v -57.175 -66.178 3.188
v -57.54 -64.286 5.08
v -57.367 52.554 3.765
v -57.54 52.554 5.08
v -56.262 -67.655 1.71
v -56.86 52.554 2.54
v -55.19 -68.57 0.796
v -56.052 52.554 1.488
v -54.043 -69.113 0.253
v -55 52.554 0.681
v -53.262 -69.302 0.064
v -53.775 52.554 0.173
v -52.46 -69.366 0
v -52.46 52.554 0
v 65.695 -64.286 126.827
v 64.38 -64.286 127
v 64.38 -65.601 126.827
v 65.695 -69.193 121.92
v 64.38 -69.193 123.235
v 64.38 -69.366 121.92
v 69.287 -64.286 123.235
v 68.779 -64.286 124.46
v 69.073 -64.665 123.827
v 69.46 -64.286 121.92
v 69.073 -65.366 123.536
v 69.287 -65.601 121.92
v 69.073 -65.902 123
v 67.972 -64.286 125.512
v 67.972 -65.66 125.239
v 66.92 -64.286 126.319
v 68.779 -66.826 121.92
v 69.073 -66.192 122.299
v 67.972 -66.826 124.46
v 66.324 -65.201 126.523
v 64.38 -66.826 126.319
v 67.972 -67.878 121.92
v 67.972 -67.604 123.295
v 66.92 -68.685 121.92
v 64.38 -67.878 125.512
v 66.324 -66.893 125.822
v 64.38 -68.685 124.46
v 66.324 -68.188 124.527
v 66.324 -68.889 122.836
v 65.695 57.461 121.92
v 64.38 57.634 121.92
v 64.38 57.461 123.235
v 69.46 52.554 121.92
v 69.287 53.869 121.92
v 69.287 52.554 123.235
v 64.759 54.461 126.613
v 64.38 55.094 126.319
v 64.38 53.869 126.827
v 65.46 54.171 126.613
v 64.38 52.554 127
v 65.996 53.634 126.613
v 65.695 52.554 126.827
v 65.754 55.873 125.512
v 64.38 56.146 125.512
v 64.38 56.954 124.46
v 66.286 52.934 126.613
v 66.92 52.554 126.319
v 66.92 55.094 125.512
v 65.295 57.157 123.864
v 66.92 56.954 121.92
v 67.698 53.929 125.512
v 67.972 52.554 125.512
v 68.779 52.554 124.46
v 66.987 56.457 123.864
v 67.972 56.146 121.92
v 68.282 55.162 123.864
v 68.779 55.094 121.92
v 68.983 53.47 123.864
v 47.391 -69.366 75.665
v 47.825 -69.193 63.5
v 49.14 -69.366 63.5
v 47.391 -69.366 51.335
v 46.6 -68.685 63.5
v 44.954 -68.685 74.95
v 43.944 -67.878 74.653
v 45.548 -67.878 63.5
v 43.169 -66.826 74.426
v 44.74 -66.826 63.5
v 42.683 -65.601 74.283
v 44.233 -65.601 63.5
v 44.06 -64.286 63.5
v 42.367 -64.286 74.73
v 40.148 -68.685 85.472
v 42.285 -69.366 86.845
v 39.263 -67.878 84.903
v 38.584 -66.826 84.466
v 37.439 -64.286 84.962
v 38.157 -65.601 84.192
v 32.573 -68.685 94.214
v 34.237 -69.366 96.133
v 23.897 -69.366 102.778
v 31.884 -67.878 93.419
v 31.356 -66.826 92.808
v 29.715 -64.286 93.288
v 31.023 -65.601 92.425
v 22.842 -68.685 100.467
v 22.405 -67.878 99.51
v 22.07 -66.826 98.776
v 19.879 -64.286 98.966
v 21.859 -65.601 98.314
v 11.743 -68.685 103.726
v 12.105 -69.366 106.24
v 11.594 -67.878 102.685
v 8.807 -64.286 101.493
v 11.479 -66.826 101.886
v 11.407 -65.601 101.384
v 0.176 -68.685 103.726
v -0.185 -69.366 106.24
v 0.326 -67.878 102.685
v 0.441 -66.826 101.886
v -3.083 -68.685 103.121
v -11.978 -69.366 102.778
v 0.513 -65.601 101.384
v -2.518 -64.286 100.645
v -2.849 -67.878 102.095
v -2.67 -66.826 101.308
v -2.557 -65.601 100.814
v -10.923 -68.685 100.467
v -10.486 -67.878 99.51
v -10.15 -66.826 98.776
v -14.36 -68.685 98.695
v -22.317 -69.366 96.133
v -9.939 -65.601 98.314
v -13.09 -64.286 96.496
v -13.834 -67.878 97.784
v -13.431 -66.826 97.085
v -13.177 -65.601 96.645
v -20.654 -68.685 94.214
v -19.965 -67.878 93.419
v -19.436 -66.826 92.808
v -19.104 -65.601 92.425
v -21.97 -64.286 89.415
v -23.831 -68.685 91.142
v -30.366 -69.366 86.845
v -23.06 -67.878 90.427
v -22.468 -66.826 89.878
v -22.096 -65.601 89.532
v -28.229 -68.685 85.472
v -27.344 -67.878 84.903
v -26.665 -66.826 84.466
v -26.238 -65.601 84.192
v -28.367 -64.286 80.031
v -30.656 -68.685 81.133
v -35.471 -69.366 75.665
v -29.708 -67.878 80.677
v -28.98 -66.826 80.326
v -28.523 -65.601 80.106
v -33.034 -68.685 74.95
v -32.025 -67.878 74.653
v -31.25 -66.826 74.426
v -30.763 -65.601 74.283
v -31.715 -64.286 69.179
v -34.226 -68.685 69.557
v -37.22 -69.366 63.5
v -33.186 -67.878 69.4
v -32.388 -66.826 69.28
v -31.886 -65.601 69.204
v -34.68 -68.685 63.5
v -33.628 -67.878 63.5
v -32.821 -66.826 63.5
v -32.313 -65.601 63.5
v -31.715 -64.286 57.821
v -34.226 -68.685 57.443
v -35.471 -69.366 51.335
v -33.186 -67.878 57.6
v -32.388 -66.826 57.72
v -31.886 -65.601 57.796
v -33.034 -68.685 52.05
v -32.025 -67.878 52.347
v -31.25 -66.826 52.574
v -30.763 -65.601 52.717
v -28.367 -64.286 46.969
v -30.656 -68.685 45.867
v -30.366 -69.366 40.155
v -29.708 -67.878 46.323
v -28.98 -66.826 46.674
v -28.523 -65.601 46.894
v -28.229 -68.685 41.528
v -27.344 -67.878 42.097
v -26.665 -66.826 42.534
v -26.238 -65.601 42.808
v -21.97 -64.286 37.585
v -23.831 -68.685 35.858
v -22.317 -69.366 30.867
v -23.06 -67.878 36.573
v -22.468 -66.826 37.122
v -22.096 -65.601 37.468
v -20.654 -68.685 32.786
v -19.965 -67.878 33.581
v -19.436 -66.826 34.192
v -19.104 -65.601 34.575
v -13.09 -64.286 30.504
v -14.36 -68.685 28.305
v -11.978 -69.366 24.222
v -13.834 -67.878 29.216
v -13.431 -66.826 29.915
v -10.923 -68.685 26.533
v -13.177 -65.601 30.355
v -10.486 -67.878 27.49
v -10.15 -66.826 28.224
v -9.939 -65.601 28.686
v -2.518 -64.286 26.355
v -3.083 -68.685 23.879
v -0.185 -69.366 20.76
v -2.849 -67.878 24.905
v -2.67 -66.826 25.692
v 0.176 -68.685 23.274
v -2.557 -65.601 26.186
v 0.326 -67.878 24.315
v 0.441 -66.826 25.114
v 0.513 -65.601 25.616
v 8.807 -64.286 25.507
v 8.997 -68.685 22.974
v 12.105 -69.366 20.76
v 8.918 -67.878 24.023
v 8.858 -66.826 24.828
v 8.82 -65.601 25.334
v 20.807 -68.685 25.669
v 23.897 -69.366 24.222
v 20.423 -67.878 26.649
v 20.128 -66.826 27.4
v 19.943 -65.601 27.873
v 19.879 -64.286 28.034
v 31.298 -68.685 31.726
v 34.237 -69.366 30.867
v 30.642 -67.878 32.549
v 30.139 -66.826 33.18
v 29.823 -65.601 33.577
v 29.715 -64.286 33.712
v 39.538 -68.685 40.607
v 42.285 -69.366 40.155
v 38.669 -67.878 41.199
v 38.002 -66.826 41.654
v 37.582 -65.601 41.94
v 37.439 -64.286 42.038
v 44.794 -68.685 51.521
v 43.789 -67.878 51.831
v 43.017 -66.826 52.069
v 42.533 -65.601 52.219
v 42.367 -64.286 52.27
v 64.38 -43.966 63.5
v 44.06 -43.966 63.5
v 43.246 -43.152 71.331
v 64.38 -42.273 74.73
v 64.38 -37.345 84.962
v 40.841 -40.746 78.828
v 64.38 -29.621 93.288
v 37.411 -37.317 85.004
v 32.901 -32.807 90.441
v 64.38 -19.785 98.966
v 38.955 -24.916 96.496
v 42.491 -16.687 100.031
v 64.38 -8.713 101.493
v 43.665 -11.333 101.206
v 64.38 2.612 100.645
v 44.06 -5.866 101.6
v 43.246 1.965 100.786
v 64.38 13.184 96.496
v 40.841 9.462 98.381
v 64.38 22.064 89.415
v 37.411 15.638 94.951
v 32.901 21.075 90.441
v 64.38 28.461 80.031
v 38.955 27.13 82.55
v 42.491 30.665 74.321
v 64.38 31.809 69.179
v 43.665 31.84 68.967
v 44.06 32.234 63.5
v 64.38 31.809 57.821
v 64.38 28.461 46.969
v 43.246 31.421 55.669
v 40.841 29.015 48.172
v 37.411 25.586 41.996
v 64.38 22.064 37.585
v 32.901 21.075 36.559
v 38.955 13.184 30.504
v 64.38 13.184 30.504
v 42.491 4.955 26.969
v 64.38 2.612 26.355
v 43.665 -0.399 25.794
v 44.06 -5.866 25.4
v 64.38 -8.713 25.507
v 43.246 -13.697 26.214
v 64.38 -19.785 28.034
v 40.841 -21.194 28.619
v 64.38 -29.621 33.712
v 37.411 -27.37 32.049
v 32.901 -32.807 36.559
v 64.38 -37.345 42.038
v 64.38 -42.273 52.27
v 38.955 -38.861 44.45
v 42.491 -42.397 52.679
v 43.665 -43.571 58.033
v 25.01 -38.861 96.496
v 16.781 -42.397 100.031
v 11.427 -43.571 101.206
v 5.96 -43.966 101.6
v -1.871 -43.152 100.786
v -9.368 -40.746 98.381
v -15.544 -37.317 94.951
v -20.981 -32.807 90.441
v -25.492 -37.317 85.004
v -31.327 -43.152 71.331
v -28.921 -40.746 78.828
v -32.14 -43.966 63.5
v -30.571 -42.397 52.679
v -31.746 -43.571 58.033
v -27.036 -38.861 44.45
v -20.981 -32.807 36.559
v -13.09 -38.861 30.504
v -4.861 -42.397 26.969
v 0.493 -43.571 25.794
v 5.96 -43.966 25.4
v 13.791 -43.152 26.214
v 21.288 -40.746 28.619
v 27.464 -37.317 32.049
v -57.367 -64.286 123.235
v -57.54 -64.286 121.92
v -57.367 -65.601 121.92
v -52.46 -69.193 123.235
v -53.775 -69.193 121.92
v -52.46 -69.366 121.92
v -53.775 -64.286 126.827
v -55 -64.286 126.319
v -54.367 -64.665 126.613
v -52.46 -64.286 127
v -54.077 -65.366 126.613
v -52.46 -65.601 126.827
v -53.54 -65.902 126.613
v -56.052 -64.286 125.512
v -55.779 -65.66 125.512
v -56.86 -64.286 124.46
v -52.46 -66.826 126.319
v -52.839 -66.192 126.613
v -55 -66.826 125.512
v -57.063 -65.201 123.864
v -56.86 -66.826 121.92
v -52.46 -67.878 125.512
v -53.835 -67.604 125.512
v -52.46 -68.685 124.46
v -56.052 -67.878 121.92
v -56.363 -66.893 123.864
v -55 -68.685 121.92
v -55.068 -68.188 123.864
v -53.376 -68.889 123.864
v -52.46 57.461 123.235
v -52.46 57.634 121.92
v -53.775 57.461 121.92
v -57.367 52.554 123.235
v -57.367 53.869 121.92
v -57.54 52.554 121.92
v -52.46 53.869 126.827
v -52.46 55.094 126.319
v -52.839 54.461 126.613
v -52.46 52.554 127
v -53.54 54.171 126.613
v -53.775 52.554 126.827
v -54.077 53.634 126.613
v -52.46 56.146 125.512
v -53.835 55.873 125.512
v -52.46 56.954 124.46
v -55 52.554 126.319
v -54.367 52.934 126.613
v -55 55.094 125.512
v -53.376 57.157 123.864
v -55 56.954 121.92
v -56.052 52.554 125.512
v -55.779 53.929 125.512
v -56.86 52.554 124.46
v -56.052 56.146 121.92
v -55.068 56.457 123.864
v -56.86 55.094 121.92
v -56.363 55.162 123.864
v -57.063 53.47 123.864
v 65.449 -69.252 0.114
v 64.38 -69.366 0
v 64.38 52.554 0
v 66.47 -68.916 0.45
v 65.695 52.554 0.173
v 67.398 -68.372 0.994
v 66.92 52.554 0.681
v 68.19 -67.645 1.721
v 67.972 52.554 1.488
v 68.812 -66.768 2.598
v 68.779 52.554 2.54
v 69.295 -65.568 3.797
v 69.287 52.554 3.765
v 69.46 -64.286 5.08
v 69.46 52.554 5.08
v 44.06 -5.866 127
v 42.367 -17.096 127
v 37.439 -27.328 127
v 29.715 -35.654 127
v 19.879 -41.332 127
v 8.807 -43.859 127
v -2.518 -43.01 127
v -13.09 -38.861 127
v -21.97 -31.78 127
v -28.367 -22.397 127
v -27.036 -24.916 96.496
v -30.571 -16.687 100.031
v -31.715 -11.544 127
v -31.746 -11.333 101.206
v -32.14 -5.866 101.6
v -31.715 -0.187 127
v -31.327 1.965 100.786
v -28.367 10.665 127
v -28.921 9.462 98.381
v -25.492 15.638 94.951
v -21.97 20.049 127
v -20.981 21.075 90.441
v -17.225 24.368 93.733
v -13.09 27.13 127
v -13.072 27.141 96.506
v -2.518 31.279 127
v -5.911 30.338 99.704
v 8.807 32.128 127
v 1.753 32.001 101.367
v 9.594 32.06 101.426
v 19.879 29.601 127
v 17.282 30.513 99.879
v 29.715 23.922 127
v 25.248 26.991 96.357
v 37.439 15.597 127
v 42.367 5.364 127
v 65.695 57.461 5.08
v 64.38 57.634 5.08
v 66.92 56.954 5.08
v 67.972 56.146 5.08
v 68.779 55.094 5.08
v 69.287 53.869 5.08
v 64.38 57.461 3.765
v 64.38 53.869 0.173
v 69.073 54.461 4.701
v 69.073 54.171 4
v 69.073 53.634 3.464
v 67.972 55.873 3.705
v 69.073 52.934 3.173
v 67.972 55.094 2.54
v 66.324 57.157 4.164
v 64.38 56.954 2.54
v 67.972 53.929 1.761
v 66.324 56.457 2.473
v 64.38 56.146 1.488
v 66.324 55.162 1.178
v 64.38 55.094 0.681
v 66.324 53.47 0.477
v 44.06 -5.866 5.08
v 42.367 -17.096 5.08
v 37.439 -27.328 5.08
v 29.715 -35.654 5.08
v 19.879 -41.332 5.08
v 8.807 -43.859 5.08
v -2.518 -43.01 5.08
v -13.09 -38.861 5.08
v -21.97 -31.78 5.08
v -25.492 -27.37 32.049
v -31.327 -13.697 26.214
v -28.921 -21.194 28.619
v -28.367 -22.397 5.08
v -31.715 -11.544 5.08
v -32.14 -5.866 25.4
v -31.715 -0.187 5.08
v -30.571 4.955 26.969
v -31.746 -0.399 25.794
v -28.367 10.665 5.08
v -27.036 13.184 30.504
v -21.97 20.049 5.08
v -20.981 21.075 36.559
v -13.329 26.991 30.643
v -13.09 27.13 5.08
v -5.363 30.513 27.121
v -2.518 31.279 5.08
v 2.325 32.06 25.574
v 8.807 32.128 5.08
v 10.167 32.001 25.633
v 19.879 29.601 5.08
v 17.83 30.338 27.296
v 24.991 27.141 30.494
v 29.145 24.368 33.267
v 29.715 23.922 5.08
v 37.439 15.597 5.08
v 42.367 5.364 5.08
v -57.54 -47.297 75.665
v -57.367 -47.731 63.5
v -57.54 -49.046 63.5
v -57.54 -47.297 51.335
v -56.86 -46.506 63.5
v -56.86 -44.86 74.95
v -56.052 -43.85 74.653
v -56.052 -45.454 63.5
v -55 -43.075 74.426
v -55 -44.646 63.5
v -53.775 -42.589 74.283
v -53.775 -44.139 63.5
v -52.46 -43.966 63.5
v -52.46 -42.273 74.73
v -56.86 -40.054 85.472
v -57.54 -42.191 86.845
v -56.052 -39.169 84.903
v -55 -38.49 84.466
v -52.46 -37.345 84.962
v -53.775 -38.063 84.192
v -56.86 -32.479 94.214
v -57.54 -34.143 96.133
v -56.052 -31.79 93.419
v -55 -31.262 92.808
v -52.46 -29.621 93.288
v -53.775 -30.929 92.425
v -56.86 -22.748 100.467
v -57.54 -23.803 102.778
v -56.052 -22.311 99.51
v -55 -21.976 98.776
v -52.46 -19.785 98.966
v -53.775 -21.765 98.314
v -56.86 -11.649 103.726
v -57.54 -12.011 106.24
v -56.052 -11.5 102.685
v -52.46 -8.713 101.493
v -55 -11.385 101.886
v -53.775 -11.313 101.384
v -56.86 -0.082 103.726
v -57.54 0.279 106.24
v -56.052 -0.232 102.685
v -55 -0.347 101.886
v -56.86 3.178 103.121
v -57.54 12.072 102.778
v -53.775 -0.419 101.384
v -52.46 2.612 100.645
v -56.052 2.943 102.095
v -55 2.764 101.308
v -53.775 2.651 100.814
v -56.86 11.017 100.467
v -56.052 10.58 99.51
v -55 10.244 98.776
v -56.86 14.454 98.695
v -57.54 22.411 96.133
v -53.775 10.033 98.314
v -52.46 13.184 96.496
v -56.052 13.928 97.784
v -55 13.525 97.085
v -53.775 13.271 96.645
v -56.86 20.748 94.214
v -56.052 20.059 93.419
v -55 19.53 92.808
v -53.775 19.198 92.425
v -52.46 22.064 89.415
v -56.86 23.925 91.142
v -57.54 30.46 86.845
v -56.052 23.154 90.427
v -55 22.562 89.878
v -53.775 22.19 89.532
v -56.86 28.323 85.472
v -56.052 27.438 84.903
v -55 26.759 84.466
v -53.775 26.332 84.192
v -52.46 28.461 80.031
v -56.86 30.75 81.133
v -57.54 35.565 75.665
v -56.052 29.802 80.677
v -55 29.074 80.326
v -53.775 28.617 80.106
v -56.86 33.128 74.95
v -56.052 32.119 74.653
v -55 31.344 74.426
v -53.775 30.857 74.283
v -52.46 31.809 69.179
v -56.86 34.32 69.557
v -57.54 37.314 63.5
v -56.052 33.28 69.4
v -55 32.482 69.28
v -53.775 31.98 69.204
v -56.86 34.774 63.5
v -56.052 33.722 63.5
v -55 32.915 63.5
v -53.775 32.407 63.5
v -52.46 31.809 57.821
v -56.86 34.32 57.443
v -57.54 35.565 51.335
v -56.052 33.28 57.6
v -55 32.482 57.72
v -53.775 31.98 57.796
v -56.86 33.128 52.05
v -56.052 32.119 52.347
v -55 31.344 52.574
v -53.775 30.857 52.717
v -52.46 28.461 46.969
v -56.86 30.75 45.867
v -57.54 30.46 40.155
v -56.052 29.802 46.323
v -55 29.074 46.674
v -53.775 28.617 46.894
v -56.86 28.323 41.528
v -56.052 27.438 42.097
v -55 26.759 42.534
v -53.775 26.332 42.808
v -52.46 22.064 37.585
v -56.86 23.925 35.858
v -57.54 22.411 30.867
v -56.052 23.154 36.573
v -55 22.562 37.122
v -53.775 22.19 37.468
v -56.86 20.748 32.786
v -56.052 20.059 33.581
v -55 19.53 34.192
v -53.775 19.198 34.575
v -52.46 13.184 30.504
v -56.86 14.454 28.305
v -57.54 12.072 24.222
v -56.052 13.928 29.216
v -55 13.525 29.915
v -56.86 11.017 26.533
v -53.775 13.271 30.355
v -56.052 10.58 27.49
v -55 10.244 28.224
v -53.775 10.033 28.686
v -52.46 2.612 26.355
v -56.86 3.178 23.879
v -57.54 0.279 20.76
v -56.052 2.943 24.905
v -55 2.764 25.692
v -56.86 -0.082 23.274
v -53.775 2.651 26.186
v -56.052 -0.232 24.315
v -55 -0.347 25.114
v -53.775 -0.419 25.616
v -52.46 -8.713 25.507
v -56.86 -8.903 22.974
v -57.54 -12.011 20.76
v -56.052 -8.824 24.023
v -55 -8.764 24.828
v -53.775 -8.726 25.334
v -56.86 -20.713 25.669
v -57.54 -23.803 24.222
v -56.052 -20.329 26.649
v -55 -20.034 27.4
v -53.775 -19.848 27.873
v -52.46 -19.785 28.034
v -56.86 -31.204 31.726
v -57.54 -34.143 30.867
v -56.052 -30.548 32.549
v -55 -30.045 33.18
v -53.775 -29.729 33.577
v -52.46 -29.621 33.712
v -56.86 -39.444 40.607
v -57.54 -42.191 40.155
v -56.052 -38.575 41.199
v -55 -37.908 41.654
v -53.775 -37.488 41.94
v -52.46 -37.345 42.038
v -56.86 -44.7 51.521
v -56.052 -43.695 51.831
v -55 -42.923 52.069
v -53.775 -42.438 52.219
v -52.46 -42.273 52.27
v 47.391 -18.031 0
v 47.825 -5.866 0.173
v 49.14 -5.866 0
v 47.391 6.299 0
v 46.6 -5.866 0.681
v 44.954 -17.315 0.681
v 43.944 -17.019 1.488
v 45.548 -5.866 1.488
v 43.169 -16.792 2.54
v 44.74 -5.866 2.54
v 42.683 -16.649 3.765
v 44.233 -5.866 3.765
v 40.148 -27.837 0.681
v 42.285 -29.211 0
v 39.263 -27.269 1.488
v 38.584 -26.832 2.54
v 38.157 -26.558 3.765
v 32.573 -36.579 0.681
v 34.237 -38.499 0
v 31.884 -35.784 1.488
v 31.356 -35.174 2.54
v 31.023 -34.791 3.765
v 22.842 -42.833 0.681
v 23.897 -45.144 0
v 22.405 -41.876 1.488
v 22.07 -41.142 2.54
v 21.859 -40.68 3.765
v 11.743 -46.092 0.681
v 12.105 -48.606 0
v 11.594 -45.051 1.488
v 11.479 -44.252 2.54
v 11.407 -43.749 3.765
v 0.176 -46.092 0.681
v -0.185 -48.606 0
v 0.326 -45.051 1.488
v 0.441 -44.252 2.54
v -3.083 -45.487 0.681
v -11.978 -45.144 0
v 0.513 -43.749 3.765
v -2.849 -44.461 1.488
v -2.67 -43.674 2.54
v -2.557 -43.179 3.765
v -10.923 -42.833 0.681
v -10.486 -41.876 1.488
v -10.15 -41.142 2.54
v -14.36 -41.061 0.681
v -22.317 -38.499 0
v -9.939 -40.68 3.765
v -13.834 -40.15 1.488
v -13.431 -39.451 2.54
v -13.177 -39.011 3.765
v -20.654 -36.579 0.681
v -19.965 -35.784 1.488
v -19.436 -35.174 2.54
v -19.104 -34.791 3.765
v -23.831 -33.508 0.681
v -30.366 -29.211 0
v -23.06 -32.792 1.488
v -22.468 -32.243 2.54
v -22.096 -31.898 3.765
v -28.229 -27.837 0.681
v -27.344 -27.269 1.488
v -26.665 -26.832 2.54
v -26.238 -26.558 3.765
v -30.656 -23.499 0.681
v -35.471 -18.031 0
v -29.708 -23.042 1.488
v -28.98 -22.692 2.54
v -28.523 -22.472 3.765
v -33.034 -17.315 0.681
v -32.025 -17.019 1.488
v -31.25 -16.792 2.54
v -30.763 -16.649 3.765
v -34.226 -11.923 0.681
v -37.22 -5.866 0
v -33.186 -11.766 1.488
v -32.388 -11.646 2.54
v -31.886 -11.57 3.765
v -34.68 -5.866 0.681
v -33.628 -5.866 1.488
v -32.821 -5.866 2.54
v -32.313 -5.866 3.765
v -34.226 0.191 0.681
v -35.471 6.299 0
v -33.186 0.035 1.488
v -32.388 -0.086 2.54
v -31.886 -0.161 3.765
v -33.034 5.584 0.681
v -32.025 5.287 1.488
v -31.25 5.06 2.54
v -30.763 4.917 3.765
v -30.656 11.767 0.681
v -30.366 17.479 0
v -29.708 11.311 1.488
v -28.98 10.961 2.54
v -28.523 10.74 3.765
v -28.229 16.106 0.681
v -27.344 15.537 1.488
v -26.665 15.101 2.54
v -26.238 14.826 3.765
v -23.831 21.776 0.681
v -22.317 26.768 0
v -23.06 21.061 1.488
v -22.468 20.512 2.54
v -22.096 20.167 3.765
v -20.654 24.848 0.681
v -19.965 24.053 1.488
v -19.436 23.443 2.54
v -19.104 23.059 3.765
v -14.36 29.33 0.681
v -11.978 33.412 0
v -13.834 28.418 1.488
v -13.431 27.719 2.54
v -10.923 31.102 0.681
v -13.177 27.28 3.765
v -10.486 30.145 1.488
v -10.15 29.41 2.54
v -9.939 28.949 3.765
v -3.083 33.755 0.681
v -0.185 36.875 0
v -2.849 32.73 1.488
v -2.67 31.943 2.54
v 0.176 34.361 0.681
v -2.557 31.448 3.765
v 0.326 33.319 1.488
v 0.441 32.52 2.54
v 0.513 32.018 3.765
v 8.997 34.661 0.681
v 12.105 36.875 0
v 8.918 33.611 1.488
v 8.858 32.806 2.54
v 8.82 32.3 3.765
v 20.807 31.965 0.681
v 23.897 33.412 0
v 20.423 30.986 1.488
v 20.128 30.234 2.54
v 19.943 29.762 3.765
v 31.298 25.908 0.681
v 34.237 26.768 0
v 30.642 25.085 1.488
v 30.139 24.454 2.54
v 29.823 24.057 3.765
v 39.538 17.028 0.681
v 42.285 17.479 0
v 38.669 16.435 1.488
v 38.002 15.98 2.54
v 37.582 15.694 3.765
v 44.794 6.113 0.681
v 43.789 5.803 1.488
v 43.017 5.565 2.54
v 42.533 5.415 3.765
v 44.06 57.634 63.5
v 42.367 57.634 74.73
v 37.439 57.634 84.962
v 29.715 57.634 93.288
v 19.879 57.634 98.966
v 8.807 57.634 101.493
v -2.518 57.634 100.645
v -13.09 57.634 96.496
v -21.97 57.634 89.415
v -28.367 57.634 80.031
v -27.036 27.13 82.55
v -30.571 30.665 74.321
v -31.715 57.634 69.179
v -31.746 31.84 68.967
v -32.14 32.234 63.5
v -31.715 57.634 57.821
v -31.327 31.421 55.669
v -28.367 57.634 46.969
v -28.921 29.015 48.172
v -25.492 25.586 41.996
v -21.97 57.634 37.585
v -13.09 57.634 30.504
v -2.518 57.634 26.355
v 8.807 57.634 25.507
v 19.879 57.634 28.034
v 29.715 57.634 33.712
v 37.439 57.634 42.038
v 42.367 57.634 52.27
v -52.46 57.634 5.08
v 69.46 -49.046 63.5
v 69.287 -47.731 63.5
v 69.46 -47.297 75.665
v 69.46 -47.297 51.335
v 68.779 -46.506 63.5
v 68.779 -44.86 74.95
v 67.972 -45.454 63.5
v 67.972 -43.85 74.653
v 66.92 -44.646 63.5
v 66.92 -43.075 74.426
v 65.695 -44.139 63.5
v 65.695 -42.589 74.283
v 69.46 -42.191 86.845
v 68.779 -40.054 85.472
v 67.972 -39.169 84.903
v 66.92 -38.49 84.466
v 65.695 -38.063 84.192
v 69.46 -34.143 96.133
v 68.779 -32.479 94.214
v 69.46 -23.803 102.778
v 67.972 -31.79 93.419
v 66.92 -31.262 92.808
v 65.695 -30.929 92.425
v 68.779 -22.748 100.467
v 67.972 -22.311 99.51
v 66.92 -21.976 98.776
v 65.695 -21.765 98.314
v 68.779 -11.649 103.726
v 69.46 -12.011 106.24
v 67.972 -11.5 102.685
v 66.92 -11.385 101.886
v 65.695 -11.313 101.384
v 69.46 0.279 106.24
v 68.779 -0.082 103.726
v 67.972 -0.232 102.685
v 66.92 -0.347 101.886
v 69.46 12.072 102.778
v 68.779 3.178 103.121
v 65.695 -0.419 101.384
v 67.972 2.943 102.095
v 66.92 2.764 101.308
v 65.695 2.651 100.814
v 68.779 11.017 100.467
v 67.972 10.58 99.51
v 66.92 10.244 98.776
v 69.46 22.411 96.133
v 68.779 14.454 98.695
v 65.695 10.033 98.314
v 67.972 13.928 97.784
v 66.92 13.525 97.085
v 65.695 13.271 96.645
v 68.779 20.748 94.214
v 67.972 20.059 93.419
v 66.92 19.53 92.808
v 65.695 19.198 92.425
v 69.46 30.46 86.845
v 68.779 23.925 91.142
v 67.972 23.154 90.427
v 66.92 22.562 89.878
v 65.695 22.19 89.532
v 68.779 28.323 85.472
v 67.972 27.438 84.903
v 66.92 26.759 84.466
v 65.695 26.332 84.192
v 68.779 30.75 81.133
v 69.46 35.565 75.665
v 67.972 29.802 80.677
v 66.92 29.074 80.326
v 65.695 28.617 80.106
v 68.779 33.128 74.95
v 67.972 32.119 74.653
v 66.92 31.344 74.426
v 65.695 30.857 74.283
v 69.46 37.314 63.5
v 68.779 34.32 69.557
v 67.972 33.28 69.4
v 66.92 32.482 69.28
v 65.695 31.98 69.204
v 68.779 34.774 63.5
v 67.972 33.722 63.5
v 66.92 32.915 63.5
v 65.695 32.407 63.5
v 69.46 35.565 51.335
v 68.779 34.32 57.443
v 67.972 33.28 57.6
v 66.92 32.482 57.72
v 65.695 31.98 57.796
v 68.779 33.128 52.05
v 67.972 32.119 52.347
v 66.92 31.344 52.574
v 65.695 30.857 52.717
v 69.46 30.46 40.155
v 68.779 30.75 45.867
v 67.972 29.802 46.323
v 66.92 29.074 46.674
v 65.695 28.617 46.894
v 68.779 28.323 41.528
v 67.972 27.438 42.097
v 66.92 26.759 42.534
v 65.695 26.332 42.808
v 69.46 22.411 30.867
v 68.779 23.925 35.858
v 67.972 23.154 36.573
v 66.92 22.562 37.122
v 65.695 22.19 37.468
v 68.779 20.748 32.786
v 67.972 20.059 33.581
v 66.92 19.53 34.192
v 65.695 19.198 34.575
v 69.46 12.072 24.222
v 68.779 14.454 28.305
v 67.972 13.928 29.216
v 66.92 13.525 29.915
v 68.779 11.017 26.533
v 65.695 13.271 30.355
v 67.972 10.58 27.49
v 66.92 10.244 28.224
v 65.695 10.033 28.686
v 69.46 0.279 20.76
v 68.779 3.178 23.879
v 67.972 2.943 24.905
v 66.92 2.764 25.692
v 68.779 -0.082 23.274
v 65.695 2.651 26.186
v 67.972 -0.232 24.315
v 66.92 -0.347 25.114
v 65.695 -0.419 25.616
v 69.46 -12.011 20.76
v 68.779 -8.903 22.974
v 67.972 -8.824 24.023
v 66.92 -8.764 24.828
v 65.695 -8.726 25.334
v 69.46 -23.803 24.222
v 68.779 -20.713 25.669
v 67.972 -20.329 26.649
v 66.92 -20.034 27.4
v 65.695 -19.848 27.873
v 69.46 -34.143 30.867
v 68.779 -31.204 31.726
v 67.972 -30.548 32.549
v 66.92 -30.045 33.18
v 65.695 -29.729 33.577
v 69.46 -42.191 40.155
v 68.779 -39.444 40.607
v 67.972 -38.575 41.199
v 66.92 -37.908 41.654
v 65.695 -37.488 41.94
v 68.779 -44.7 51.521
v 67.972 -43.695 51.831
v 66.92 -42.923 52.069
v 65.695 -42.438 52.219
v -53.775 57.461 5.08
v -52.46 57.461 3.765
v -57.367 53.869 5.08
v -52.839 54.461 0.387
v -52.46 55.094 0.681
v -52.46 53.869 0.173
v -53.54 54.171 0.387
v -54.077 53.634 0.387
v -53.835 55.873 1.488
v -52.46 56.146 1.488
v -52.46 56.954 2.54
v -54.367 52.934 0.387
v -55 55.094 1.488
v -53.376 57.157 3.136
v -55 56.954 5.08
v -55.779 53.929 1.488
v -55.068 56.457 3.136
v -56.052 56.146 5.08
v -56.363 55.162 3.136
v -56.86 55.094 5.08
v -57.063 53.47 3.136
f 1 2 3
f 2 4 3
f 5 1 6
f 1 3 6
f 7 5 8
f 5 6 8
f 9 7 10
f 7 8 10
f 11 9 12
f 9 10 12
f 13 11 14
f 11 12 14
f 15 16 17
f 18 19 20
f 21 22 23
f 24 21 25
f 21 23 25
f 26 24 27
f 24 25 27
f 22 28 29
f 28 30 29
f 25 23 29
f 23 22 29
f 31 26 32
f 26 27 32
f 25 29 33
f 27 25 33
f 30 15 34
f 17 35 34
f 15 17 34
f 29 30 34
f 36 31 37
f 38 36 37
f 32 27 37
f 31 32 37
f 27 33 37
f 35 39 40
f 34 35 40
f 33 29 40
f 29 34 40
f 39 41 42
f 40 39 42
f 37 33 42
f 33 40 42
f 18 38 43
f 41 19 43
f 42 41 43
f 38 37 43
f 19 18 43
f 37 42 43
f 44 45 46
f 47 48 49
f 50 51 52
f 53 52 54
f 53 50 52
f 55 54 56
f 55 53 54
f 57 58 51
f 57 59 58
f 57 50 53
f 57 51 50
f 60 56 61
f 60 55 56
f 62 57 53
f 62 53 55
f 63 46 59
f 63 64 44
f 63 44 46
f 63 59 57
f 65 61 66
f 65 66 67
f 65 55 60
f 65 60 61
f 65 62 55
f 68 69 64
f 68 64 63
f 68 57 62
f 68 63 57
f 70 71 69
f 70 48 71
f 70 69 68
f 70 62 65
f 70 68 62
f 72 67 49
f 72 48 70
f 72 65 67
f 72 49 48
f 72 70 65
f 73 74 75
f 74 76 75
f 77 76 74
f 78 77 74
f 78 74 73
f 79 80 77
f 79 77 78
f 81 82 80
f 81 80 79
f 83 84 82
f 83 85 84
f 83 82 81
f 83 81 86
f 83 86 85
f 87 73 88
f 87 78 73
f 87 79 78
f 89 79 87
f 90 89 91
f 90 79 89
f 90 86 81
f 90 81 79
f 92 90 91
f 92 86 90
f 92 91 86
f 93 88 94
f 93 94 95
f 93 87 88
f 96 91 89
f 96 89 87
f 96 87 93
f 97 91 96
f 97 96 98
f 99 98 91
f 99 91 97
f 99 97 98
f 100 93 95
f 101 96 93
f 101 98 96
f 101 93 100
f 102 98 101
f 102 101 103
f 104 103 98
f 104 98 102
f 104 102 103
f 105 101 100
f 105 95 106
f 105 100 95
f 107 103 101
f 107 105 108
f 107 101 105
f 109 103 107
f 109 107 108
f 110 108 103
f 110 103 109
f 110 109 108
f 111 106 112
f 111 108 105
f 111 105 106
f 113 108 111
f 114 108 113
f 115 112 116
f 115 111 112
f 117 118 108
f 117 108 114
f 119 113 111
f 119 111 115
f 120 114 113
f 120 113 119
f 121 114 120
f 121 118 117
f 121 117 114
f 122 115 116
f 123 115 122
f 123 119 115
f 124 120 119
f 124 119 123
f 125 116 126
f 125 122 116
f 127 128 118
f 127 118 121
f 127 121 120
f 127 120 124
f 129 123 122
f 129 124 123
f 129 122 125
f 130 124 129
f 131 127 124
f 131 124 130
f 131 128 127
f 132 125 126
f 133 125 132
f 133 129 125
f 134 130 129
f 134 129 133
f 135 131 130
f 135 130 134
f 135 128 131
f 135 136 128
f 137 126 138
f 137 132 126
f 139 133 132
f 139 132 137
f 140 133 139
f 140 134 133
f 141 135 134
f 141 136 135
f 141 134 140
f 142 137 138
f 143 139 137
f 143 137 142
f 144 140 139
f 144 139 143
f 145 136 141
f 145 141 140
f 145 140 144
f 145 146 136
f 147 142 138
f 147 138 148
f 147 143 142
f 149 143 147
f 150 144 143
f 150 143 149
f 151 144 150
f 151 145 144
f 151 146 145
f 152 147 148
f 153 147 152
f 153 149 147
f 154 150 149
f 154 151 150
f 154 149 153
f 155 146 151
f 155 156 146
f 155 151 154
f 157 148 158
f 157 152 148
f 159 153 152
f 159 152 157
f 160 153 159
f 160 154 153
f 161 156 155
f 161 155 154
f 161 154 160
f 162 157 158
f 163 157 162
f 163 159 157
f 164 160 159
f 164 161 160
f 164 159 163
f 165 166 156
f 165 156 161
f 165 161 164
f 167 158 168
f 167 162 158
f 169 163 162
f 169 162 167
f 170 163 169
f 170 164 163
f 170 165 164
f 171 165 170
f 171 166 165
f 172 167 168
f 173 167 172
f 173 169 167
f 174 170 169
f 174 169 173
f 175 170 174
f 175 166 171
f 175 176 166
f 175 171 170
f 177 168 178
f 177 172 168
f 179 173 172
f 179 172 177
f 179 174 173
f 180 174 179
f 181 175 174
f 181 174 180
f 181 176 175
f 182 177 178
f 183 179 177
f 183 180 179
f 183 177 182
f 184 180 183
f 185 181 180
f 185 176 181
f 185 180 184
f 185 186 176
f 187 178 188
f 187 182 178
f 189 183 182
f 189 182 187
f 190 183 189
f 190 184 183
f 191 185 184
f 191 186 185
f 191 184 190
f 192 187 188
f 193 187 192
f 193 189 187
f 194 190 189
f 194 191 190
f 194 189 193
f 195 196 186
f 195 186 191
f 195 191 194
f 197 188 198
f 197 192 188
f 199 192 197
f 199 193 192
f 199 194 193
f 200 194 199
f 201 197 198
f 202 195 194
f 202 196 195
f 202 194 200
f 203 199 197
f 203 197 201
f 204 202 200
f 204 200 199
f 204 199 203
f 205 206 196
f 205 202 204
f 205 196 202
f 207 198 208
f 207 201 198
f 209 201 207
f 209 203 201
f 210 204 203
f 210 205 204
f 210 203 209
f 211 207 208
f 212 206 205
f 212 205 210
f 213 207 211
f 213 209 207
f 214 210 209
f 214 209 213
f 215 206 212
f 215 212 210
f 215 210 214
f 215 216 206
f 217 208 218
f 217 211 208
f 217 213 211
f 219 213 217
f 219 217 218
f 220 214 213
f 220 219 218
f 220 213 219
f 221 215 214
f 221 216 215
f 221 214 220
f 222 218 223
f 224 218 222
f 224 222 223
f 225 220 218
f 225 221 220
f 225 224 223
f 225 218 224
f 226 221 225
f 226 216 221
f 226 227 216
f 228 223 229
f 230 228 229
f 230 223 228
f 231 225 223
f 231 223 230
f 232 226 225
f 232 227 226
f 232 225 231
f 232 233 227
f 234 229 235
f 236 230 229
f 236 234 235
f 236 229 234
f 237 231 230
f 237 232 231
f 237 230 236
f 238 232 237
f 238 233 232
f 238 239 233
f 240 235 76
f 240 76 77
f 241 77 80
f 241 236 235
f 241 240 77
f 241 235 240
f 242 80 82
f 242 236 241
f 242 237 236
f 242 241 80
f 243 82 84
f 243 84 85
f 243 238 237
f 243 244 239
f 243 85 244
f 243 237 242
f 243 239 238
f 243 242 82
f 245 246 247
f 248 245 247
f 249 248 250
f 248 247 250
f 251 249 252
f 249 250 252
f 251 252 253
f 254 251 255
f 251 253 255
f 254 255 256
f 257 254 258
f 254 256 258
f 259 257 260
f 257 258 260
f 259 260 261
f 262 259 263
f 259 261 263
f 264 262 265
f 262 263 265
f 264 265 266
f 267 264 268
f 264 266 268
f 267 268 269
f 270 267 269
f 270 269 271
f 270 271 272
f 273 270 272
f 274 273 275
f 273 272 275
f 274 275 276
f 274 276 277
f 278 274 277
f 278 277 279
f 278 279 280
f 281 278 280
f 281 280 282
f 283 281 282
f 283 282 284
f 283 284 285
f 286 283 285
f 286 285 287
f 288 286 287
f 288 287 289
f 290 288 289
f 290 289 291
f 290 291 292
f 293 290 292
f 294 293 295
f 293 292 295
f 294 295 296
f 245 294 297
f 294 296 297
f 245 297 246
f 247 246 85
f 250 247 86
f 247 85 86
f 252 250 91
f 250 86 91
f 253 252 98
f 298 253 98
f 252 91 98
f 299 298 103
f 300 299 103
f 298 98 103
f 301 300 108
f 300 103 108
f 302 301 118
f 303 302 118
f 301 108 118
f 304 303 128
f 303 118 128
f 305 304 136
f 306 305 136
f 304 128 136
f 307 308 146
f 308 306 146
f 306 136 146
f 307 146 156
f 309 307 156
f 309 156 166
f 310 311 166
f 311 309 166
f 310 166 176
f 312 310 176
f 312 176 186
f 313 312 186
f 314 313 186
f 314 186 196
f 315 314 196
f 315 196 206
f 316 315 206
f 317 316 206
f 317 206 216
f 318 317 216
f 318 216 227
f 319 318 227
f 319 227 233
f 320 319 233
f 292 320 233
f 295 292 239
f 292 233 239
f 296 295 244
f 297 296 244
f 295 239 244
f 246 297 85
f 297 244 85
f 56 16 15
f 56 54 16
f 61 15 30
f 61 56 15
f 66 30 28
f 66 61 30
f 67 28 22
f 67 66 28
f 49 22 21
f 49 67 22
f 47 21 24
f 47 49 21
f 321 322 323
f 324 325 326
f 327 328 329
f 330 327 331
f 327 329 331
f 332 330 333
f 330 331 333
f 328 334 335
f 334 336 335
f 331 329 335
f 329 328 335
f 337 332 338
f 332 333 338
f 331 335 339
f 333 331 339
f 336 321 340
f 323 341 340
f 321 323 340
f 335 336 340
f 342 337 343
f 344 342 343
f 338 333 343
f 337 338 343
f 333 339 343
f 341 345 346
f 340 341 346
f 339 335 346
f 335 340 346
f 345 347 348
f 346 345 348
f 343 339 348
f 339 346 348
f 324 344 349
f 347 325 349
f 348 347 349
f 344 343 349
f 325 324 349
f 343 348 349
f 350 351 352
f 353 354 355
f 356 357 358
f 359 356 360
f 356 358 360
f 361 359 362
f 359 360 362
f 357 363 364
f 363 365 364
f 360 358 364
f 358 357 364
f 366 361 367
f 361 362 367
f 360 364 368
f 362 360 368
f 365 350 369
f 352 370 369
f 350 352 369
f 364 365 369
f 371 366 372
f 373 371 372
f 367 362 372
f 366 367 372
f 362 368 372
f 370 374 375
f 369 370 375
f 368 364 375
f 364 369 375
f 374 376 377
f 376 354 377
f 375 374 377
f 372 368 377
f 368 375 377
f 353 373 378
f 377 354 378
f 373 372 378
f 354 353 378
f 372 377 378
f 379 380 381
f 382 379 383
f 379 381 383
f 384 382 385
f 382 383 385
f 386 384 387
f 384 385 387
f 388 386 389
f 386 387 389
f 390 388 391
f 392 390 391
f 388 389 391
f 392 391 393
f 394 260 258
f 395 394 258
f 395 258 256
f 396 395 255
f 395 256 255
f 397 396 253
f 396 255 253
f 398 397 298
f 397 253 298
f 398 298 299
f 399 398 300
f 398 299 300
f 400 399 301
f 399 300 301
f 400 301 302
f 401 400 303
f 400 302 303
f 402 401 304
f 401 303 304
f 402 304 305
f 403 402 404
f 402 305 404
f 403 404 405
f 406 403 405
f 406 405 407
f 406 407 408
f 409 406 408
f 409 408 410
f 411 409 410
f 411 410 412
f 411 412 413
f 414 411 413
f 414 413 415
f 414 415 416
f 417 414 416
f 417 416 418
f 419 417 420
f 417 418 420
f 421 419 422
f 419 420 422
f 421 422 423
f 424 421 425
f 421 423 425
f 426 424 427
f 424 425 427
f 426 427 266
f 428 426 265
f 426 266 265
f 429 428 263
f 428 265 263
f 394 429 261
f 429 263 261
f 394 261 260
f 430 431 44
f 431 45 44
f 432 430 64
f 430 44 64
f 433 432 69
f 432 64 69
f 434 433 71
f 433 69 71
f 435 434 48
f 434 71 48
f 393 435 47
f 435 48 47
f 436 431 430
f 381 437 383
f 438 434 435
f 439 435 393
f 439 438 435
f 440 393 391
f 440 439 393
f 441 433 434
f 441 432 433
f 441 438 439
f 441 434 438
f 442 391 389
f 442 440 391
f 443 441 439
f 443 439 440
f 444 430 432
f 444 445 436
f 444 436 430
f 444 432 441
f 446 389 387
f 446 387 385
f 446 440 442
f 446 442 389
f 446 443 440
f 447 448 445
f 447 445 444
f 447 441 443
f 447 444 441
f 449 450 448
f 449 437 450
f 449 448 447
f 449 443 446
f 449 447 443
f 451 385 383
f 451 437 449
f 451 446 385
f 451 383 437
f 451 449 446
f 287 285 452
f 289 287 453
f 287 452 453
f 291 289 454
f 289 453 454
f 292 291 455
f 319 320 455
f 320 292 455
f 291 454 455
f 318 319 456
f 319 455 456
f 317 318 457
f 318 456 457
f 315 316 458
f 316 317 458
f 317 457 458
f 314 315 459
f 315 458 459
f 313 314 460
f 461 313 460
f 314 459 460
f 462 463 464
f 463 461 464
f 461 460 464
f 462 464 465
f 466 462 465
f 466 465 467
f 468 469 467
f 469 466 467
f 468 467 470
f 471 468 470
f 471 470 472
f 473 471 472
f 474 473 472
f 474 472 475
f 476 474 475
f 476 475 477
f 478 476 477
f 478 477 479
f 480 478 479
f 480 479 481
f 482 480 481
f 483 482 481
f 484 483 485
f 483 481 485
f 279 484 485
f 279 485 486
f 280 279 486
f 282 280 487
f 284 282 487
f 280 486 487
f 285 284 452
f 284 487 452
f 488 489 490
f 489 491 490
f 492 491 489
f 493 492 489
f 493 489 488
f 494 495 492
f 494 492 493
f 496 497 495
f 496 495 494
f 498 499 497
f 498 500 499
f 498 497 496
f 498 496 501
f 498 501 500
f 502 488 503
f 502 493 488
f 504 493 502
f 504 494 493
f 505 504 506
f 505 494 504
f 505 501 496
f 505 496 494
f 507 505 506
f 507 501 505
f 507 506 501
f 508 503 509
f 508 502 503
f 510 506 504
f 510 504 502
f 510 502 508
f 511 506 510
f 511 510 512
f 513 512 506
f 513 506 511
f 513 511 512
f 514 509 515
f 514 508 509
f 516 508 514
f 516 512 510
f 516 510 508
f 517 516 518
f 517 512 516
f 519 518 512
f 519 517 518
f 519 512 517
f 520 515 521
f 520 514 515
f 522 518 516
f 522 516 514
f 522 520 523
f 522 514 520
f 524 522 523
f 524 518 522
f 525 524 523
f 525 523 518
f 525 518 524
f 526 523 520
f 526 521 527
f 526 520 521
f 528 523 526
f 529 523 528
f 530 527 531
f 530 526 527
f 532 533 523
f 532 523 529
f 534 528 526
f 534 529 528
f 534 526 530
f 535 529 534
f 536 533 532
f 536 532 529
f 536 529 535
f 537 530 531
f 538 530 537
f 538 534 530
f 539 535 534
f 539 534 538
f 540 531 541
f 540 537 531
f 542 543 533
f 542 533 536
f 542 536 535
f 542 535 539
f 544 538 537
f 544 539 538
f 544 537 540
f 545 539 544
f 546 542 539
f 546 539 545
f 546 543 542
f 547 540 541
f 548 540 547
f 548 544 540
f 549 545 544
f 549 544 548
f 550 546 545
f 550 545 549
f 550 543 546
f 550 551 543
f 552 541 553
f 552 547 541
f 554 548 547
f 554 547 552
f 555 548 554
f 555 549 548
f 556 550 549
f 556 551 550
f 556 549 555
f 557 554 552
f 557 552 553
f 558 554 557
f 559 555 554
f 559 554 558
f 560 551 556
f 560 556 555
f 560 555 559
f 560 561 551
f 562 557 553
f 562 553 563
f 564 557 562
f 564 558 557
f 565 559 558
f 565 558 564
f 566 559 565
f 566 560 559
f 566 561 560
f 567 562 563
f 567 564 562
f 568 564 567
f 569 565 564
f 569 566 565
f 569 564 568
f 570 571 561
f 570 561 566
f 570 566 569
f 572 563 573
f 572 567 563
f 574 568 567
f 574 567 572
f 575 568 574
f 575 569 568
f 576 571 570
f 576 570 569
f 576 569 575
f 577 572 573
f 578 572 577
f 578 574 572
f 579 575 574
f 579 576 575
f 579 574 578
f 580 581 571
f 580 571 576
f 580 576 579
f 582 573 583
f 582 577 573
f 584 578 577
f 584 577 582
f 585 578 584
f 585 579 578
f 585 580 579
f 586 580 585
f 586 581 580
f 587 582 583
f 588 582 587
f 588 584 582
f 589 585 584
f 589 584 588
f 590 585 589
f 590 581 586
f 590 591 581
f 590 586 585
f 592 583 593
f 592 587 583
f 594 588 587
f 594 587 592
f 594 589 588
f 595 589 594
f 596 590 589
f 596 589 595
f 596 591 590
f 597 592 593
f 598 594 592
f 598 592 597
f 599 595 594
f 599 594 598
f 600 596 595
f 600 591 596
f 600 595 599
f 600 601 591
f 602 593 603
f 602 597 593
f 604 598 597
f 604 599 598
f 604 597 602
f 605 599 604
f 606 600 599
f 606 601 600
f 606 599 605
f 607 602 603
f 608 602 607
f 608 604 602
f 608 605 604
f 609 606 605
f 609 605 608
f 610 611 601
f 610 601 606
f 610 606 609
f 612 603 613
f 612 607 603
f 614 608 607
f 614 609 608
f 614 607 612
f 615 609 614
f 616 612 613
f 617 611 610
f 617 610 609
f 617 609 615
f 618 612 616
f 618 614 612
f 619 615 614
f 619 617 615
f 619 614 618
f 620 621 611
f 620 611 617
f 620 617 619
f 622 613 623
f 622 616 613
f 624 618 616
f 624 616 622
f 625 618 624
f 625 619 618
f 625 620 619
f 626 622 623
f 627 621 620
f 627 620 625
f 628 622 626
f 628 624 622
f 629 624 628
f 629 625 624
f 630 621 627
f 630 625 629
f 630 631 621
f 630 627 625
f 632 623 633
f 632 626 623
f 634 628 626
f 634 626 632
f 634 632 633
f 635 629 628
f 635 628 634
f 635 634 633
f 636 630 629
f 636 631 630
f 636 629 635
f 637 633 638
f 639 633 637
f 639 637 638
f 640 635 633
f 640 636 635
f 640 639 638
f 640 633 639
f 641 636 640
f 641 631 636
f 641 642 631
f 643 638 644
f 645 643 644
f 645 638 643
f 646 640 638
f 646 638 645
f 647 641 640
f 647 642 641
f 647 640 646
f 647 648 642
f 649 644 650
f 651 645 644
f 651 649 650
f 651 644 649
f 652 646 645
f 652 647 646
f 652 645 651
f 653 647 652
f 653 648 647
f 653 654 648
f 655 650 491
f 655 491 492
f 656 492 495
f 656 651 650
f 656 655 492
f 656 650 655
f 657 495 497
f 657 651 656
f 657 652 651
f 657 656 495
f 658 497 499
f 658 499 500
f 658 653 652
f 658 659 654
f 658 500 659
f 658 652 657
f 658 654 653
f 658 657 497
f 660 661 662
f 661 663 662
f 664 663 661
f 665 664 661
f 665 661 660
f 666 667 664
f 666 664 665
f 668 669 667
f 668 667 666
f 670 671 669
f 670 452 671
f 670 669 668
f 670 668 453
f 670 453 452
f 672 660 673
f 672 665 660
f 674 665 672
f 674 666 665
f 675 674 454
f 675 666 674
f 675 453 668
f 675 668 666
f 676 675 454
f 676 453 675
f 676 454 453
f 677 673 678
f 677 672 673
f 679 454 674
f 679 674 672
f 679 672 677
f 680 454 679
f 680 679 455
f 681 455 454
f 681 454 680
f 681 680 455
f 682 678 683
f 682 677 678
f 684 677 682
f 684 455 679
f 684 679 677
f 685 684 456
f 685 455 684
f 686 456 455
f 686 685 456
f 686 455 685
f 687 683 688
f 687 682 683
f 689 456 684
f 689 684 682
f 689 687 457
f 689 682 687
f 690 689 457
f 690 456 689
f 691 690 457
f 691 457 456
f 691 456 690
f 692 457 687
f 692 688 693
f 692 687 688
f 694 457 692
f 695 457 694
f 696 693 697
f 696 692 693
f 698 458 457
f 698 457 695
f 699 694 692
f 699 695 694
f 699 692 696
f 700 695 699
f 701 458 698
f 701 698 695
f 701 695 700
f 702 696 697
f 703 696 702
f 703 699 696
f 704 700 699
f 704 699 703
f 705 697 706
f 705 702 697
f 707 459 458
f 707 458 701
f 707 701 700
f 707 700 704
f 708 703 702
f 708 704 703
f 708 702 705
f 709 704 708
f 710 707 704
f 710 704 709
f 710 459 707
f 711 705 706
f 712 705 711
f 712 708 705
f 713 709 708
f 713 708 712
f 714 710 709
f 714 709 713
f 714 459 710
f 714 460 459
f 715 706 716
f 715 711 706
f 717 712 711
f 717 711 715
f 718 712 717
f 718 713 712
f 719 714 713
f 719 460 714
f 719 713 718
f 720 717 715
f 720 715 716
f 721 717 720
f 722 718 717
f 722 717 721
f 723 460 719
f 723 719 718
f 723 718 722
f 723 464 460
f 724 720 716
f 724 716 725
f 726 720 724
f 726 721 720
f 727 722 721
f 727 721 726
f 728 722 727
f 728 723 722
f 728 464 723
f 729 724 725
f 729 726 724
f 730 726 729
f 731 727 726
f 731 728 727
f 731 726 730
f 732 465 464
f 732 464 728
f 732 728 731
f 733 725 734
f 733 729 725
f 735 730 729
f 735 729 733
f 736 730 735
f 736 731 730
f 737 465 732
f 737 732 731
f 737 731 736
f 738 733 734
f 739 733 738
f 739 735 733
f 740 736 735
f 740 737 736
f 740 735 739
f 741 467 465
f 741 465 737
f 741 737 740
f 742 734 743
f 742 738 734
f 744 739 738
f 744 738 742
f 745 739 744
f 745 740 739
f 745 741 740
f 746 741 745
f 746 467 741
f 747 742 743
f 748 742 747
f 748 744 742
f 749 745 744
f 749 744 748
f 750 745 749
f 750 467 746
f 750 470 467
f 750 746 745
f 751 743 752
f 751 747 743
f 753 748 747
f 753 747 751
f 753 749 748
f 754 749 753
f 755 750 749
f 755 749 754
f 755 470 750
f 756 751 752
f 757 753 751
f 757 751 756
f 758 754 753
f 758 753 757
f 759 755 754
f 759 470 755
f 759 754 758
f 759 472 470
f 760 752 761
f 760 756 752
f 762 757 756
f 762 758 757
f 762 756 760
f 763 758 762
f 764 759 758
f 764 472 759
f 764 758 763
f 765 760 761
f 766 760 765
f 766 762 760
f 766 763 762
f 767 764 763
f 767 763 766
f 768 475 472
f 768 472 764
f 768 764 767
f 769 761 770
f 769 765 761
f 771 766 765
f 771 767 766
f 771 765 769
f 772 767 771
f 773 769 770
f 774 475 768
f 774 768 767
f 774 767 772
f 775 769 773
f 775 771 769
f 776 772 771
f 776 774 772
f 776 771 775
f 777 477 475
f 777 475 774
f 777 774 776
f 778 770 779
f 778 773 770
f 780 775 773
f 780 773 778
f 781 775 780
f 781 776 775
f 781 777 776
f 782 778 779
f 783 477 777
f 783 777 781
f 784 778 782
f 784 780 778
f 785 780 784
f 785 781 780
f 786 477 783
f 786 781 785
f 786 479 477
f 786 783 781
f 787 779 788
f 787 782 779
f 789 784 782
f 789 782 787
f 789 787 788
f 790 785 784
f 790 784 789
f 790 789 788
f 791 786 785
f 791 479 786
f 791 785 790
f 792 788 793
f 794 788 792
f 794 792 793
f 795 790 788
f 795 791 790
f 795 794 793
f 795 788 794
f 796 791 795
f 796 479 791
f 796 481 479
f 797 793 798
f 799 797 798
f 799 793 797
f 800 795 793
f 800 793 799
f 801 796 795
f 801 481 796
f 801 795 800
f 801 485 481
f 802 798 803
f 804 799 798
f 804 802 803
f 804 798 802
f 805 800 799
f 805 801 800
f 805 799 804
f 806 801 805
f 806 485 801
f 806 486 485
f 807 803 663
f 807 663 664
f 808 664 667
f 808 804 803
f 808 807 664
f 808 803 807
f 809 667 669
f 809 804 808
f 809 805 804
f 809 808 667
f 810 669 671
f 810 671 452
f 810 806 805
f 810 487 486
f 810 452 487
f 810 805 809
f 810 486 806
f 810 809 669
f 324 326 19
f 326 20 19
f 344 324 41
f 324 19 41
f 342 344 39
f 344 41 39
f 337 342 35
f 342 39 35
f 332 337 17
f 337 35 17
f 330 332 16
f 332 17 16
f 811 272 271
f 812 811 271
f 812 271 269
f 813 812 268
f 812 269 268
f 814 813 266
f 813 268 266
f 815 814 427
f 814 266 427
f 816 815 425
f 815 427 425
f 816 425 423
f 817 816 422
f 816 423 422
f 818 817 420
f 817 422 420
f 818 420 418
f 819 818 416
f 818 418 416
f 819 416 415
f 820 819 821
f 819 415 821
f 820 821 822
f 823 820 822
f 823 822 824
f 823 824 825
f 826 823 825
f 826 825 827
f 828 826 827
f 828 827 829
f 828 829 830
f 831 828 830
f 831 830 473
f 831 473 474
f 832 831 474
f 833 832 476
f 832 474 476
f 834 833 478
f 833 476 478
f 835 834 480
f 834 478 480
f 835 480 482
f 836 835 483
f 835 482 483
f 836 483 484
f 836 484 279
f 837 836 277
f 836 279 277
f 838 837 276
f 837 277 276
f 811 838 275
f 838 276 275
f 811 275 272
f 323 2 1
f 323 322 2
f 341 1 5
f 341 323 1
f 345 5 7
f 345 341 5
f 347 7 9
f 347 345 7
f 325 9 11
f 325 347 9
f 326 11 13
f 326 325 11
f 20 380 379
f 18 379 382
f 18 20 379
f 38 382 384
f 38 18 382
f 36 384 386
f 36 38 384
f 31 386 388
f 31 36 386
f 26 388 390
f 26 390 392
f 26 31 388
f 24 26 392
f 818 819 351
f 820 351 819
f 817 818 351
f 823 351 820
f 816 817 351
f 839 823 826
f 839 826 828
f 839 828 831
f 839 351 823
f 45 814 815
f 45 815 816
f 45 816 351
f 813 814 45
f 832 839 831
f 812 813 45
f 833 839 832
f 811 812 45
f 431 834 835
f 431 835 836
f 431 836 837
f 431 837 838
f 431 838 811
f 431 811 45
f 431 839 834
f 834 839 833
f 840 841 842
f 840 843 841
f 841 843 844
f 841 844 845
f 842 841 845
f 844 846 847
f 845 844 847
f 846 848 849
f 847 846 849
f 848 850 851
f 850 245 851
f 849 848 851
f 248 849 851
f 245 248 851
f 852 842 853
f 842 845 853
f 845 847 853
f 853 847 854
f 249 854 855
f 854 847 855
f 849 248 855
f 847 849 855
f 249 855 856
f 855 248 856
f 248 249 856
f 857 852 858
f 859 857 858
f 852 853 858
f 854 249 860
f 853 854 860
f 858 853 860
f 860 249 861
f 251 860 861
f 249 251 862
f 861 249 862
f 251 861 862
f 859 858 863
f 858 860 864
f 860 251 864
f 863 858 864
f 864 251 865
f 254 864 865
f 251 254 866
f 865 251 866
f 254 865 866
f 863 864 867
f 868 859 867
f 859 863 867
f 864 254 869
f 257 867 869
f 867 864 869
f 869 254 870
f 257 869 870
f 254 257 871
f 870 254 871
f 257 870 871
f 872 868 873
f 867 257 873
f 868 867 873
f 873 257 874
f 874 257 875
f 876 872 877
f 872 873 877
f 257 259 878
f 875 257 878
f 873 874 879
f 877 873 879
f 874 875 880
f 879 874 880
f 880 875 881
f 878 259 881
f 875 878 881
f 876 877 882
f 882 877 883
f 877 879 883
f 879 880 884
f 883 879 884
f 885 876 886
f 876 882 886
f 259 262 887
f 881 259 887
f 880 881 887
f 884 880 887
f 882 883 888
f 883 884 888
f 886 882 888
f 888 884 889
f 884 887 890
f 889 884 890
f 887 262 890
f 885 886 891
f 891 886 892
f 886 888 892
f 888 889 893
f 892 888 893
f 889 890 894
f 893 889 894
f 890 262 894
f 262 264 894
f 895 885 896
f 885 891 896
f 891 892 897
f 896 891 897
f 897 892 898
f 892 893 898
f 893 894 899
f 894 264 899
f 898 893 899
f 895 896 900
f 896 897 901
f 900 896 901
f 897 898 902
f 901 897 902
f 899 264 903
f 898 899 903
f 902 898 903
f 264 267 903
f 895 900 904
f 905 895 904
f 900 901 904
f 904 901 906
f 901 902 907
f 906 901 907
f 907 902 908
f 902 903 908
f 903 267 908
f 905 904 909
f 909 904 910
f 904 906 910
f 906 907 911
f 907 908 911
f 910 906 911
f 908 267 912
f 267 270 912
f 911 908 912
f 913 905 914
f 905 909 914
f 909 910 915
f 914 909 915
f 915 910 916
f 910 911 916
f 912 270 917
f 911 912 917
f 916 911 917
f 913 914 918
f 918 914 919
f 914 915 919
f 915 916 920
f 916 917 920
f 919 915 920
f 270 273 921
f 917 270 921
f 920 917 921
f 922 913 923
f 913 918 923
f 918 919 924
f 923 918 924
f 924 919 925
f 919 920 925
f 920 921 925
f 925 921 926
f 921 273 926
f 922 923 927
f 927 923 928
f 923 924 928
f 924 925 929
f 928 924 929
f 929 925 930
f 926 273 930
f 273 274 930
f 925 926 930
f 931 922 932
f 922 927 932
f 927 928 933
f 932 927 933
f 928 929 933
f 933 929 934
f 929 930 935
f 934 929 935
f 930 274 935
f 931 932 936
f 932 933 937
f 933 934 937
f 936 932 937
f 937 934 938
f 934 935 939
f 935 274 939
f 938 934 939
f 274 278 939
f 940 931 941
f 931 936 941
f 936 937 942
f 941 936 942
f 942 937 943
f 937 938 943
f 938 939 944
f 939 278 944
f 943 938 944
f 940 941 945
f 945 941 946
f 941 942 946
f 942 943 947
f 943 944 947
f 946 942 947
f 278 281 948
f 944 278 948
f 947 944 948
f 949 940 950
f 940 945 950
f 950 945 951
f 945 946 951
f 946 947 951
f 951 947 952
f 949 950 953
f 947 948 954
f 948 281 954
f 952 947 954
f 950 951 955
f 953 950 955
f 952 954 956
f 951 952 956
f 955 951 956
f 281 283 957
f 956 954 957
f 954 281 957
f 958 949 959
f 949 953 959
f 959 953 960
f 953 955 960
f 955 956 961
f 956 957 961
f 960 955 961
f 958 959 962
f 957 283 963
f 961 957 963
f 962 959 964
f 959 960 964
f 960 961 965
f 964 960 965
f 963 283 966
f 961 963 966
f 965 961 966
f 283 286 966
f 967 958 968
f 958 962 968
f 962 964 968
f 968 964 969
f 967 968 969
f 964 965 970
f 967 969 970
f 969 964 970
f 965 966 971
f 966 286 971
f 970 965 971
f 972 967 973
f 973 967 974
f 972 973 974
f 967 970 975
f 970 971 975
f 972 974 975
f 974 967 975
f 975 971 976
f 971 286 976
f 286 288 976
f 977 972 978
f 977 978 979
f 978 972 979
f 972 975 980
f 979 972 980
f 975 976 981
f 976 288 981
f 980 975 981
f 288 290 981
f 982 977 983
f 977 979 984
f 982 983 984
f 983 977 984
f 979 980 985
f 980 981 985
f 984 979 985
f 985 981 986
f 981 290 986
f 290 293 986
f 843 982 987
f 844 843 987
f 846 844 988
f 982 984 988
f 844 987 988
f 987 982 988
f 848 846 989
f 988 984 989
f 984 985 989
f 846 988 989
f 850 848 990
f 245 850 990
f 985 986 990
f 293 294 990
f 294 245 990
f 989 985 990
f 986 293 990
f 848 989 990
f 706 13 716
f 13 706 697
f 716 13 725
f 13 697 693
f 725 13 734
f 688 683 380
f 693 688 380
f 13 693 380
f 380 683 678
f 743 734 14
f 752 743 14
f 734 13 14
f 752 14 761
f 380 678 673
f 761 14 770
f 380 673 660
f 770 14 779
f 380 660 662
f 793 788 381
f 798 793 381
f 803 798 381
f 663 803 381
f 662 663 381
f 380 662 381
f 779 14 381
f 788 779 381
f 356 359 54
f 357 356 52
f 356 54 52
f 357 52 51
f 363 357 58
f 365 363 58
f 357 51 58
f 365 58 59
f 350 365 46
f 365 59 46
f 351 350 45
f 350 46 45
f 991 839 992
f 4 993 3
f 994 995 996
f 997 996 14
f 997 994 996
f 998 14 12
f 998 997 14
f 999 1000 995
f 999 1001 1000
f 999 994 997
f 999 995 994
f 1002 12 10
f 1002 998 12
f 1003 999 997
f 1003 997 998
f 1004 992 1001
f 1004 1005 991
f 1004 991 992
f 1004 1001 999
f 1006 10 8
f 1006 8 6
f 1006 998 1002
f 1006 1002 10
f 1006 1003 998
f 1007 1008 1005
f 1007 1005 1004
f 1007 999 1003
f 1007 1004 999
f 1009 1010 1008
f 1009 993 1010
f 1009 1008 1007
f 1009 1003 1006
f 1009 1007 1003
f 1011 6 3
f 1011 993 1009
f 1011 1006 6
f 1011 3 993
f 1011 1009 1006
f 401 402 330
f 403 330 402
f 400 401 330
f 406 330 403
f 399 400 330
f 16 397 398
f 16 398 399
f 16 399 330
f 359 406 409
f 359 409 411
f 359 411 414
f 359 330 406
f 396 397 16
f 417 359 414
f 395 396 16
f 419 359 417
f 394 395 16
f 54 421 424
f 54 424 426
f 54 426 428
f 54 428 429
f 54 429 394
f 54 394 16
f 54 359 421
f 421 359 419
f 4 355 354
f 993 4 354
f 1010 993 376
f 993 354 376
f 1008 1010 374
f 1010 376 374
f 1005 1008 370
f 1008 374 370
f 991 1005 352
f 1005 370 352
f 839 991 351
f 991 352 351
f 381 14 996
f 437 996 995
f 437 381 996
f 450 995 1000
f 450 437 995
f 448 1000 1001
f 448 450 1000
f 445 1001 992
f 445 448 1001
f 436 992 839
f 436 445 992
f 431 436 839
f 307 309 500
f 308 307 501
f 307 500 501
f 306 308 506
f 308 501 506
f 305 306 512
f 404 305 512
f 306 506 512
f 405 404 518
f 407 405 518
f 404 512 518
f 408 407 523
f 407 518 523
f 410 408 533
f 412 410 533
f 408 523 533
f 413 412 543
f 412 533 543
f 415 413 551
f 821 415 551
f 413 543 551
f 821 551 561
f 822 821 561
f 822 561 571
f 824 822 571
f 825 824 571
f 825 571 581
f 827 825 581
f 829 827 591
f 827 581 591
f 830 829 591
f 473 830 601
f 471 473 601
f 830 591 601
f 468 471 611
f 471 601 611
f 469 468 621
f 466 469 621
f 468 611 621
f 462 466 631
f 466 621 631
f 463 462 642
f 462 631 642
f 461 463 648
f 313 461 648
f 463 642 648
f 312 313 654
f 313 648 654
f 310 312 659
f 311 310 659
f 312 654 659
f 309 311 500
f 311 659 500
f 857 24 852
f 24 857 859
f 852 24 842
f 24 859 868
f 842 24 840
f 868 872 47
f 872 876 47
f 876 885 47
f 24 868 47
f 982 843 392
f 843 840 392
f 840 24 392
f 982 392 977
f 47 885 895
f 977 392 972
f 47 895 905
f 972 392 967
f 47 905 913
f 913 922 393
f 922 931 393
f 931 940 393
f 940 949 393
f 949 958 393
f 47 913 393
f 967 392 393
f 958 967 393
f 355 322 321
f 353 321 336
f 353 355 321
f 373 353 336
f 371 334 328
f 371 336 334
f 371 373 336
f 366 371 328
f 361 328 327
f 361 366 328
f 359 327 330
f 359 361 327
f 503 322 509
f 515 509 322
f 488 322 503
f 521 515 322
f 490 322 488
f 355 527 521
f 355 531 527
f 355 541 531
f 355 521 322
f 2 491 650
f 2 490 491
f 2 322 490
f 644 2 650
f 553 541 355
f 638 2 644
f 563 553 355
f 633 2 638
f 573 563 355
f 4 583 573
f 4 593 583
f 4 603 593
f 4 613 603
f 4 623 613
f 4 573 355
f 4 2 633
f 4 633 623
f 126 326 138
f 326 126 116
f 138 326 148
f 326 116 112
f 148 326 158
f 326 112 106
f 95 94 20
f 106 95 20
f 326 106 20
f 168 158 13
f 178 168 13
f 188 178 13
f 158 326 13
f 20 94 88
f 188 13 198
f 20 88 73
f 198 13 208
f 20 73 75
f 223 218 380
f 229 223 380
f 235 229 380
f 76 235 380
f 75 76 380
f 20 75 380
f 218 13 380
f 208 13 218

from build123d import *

# Parameters (mm, degrees)
F0_W     = 127
F0_H     = 127
F1_DEPTH = 127
F2_R     = 38.1
F3_DEPTH = 127
F4_R     = 38.1
F5_DEPTH = 127
F6_R     = 38.1
F7_DEPTH = 127
F8_R     = 5.08


with BuildPart() as f1:
    # F0 (on Top) → F1 (new body)
    with BuildSketch(Plane.XY):
        with Locations((5.959775, -5.865746)):
            Rectangle(F0_W, F0_H)
    extrude(amount=F1_DEPTH)

    # F2 (on face) → F3 (cut)
    with BuildSketch(Plane(origin=(-57.540225, 0, 0), x_dir=(0, -1, 0), z_dir=(-1, 0, 0))):
        with Locations((5.865746, 63.5)):
            Circle(F2_R)
    extrude(amount=-F3_DEPTH, mode=Mode.SUBTRACT)

    # F4 (on face) → F5 (cut)
    with BuildSketch(Plane.XZ.offset(69.365746)):
        with Locations((5.959775, 63.5)):
            Circle(F4_R)
    extrude(amount=-F5_DEPTH, mode=Mode.SUBTRACT)

    # F6 (on face) → F7 (cut)
    with BuildSketch(Plane(origin=(0, 0, 0), x_dir=(1, 0, 0), z_dir=(0, 0, -1))):
        with Locations((5.959775, 5.865746)):
            Circle(F6_R)
    extrude(amount=-F7_DEPTH, mode=Mode.SUBTRACT)

    # F8
    f8_edges = [f1.edges().sort_by_distance(p)[0] for p in [
        (-57.540225, 57.634254, 63.5),
        (5.959775, 57.634254, 0),
        (69.459775, 57.634254, 63.5),
        (5.959775, 57.634254, 127),
        (-57.540225, -5.865746, 0),
        (-57.540225, -69.365746, 63.5),
        (-57.540225, -5.865746, 127),
        (5.959775, -69.365746, 127),
        (69.459775, -5.865746, 127),
        (69.459775, -5.865746, 0),
        (69.459775, -69.365746, 63.5),
        (69.459775, 32.234254, 63.5),
        (-32.140225, -5.865746, 0),
        (-57.540225, 32.234254, 63.5),
        (-32.140225, -69.365746, 63.5),
    ]]
    fillet(f8_edges, radius=F8_R)


solid = f1.part
